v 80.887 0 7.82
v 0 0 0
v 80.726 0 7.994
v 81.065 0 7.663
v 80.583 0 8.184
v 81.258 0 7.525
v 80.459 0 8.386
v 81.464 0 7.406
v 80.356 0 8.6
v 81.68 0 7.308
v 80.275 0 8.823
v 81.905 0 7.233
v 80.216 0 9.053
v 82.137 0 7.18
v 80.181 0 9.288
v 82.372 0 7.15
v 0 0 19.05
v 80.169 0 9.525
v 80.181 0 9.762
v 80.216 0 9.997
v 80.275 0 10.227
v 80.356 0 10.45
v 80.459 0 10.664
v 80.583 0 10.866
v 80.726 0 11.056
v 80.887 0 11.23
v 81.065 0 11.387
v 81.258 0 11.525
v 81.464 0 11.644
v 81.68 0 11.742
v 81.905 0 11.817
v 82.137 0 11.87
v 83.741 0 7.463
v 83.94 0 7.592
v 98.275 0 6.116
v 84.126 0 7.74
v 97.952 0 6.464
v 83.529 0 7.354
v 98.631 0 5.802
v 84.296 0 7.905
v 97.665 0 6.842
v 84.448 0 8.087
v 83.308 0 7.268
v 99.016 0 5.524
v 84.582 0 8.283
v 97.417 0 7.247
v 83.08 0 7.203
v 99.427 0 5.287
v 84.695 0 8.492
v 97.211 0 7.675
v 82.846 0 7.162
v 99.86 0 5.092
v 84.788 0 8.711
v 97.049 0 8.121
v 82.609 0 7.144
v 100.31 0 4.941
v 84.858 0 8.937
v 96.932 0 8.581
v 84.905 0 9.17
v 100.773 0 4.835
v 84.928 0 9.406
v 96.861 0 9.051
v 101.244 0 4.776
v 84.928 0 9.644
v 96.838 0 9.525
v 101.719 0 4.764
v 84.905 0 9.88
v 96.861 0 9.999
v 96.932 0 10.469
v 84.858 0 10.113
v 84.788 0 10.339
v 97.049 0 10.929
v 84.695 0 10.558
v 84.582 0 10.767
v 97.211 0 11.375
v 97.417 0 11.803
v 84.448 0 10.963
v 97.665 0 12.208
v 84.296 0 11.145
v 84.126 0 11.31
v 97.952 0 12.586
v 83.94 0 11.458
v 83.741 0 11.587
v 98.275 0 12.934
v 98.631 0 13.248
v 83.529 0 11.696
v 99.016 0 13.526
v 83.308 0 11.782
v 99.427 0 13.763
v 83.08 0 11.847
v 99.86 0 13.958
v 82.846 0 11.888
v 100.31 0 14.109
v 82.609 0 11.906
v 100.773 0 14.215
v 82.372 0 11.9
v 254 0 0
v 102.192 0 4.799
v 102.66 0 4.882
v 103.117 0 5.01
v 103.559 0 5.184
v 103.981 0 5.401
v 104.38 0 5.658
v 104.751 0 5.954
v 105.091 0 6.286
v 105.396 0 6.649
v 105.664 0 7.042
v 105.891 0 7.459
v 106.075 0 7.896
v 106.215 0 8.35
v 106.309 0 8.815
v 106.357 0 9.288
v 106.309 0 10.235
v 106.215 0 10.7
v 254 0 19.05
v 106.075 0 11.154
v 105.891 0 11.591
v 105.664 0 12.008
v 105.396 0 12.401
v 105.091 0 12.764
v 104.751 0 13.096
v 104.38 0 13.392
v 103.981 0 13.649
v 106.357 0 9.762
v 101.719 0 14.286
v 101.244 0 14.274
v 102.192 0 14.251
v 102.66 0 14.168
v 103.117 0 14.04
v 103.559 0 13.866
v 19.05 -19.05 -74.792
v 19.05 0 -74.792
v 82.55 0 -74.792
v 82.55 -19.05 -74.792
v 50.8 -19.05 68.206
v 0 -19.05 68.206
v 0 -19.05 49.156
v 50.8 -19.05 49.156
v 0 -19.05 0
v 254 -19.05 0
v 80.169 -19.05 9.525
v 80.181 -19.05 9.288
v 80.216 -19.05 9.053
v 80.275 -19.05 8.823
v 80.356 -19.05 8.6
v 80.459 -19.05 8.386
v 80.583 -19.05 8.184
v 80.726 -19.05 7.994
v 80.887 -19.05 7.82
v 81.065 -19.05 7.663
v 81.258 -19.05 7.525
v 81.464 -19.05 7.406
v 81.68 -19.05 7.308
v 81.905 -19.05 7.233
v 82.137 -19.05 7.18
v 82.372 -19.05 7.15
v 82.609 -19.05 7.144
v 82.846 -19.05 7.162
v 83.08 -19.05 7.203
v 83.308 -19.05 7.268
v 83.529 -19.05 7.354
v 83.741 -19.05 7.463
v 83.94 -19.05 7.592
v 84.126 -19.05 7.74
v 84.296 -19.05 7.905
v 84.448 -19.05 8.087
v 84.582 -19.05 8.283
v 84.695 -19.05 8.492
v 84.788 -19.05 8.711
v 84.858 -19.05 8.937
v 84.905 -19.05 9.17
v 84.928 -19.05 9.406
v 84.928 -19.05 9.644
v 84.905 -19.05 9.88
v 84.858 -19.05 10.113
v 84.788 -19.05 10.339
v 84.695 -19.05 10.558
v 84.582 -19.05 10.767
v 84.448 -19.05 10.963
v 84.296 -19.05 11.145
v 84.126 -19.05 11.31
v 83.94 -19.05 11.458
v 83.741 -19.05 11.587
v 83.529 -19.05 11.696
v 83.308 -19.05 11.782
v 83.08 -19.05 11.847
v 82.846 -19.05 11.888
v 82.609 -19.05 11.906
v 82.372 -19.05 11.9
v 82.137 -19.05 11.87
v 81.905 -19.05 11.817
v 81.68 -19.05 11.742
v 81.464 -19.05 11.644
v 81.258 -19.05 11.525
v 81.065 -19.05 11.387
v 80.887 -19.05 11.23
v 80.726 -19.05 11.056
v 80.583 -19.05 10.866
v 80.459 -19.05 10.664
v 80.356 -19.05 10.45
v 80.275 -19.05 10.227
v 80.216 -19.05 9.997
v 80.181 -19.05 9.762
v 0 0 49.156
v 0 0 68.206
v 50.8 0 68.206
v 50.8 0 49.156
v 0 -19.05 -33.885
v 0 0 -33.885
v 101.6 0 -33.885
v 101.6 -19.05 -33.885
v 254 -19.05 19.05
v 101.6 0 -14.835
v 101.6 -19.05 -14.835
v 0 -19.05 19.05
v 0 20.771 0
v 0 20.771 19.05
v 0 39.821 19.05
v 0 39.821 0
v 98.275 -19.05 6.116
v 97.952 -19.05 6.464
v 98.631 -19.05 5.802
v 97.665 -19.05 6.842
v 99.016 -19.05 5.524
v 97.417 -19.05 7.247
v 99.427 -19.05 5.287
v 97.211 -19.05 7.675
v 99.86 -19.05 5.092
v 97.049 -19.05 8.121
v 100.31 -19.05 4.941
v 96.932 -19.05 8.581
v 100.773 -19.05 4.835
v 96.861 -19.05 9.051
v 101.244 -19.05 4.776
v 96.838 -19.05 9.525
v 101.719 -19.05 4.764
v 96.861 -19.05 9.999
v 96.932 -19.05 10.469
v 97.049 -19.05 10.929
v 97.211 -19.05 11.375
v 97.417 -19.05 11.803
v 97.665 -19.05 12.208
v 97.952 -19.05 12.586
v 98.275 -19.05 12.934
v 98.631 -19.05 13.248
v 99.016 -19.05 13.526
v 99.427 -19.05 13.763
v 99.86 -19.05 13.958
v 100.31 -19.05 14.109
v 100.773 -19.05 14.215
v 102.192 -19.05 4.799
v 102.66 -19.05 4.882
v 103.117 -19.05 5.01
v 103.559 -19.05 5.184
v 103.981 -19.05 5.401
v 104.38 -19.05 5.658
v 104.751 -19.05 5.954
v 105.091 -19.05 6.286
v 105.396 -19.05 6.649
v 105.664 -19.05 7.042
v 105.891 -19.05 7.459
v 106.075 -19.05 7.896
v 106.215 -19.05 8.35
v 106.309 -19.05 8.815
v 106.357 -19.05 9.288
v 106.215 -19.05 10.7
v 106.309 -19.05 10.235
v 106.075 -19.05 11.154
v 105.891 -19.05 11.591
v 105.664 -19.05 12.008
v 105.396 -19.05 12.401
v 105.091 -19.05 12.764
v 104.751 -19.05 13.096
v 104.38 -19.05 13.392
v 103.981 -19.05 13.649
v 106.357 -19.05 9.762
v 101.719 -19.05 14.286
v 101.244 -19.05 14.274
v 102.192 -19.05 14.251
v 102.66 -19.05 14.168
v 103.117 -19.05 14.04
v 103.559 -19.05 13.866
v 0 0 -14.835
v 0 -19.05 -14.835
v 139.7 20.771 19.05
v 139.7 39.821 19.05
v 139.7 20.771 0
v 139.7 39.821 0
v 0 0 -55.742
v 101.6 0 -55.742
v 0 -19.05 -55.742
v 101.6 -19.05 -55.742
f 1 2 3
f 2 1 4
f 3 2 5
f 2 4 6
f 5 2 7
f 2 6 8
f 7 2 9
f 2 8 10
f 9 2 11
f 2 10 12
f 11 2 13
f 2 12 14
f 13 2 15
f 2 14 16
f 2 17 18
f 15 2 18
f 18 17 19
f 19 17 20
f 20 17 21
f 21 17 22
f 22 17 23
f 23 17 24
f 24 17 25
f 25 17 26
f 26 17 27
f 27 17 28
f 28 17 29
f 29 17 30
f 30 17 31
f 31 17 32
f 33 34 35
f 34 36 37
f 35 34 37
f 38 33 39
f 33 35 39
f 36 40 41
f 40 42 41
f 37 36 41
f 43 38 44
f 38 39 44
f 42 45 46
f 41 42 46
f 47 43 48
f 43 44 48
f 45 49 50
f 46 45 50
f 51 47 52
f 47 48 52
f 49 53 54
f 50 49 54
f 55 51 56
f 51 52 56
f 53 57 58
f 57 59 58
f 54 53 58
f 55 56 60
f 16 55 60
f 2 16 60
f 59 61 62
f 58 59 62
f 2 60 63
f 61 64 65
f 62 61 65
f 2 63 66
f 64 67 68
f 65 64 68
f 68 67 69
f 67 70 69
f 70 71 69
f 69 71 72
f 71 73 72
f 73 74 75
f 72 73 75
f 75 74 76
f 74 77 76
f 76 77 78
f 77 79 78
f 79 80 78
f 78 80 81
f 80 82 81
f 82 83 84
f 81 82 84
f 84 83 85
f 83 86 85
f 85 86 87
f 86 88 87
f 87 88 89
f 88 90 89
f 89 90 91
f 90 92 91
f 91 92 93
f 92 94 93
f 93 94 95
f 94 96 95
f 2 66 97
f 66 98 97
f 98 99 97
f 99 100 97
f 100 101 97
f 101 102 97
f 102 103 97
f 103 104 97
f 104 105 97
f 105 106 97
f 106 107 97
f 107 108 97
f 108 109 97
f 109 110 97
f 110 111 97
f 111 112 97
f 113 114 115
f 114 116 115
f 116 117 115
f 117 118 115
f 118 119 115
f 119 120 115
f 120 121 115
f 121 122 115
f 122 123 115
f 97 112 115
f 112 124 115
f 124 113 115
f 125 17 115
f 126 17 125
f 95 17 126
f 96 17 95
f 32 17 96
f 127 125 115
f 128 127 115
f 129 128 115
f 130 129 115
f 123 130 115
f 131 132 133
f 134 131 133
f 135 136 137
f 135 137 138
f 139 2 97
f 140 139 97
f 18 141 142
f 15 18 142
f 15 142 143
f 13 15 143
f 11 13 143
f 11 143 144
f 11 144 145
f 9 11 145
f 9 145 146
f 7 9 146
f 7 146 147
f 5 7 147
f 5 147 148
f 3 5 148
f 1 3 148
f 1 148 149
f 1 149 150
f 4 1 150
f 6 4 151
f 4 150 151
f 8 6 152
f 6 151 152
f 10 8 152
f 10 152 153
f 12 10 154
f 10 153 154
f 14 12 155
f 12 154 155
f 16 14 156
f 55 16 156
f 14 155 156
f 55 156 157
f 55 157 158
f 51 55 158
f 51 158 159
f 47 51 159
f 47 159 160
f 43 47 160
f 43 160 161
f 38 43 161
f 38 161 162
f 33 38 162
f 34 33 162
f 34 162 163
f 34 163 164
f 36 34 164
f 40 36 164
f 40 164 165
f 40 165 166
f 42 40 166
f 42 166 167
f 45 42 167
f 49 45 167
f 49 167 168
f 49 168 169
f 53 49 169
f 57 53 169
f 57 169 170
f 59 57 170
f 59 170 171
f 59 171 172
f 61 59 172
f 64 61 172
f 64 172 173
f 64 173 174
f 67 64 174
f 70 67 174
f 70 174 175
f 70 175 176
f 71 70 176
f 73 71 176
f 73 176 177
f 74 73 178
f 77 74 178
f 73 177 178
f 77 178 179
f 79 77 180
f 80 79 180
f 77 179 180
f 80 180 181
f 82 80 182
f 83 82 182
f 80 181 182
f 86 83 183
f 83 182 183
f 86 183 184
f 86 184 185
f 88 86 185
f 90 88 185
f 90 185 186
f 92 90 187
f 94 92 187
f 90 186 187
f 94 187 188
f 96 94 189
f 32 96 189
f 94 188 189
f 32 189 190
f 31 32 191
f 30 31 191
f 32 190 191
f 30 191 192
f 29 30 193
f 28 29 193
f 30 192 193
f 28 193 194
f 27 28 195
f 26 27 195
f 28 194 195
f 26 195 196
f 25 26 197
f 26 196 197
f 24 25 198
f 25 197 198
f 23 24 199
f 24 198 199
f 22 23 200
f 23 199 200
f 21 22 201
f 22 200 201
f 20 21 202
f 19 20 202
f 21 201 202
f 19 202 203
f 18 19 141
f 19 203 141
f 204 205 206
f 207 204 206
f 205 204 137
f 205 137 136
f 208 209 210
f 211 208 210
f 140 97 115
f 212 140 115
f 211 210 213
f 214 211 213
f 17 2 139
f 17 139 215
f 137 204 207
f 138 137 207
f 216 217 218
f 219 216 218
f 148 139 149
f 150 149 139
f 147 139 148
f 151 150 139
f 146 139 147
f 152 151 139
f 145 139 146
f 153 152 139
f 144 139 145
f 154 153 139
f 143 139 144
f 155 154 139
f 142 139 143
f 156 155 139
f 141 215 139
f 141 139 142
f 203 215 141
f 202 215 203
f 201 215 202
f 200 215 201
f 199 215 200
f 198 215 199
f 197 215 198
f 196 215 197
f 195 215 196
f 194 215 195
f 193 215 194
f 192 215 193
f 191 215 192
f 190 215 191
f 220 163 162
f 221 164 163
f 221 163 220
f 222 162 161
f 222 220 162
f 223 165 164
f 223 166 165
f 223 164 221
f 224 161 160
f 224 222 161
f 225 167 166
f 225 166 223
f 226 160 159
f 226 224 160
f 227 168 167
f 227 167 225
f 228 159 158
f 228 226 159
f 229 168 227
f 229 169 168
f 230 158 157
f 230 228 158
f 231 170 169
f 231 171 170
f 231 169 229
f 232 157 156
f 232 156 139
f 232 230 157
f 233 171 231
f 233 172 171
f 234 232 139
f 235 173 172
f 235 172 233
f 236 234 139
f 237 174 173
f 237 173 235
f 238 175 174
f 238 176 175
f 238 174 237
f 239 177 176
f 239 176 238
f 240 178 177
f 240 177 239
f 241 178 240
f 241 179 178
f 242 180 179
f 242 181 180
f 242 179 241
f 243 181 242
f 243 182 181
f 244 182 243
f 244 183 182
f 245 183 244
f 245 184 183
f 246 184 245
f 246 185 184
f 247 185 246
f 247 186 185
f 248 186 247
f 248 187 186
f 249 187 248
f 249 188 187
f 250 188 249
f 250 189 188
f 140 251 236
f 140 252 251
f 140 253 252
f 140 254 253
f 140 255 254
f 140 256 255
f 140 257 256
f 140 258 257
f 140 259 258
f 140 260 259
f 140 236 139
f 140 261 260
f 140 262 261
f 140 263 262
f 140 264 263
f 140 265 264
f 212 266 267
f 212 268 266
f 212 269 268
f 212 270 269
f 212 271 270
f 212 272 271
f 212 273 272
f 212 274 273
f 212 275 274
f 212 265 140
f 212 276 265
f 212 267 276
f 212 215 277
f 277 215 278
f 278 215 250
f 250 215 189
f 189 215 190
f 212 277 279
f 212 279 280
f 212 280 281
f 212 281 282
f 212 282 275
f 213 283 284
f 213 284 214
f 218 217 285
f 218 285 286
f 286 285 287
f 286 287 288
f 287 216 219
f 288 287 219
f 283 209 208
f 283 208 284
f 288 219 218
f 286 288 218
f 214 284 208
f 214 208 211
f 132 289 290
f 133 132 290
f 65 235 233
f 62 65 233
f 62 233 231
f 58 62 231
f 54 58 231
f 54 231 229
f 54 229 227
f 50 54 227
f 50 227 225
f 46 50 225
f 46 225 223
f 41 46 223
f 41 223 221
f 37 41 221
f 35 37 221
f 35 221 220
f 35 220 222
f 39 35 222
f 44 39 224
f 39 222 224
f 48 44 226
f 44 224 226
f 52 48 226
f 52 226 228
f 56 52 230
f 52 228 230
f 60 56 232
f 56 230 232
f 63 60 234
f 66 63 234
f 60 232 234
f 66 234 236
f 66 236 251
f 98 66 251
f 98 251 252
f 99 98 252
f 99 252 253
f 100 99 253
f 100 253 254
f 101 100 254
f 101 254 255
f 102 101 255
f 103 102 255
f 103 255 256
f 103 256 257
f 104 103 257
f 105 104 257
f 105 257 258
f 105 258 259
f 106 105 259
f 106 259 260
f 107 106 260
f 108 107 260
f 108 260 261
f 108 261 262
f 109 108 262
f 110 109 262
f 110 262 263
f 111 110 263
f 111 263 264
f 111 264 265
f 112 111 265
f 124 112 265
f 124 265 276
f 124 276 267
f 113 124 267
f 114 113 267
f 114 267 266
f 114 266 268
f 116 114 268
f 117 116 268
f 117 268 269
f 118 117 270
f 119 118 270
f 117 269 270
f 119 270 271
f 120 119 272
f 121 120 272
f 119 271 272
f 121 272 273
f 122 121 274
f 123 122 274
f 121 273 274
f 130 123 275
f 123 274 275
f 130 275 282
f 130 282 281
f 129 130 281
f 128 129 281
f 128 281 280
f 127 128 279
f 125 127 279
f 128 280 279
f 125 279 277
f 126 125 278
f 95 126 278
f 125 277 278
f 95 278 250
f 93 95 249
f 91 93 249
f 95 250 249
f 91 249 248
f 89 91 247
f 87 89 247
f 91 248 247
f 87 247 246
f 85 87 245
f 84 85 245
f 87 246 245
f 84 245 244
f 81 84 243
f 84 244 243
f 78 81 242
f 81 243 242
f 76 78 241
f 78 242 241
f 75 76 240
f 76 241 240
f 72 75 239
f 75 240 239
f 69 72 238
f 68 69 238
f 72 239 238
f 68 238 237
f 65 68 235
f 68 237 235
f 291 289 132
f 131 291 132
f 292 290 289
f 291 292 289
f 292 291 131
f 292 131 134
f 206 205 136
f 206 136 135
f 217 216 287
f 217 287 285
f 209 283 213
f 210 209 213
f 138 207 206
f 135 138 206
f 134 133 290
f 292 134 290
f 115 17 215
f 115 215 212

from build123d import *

# Parameters (mm, degrees)
F0_W      = 254
F0_H      = 19.05
F1_DEPTH  = 19.05
F3_DEPTH  = 25.4
F4_W      = 101.6
F4_H      = 19.05
F5_DEPTH  = 19.05
F7_DEPTH  = 19.05
F8_W      = 50.8
F8_H      = 19.05
F9_DEPTH  = 19.05
F10_W     = 19.05
F10_H     = 19.05
F11_DEPTH = 139.7


with BuildPart() as f1:
    # F0 (on Front) → F1 (new body)
    with BuildSketch(Plane.XZ):
        with Locations((127, 9.525)):
            Rectangle(F0_W, F0_H)
    extrude(amount=F1_DEPTH)

    # F2 (on face) → F3 (cut)
    with BuildSketch(Plane.XZ.offset(19.05)):
        with BuildLine():
            ThreePointArc((84.93125, 9.525), (82.55, 11.90625), (80.16875, 9.525))
            Line((80.16875, 9.525), (82.55, 9.525))
            Line((82.55, 9.525), (84.93125, 9.525))
        make_face()
        with BuildLine():
            ThreePointArc((106.3625, 9.525), (101.6, 14.2875), (96.8375, 9.525))
            ThreePointArc((96.8375, 9.525), (101.6, 4.7625), (106.3625, 9.525))
        make_face()
        with BuildLine():
            Line((82.55, 9.525), (80.16875, 9.525))
            ThreePointArc((80.16875, 9.525), (82.55, 7.14375), (84.93125, 9.525))
            Line((84.93125, 9.525), (82.55, 9.525))
        make_face()
    extrude(amount=-F3_DEPTH, mode=Mode.SUBTRACT)


with BuildPart() as f5:
    # F4 (on Front) → F5 (new body)
    with BuildSketch(Plane.XZ):
        with Locations((50.8, -24.360368)):
            Rectangle(F4_W, F4_H)
    extrude(amount=F5_DEPTH)


with BuildPart() as f7:
    # F6 (on Front) → F7 (new body)
    with BuildSketch(Plane.XZ):
        Polygon((101.6, -55.741971), (0, -55.741971), (19.05, -74.791971), (82.55, -74.791971), align=None)
    extrude(amount=F7_DEPTH)


with BuildPart() as f9:
    # F8 (on Front) → F9 (new body)
    with BuildSketch(Plane.XZ):
        with Locations((25.4, 58.681494)):
            Rectangle(F8_W, F8_H)
    extrude(amount=F9_DEPTH)


with BuildPart() as f11:
    # F10 (on Right) → F11 (new body)
    with BuildSketch(Plane.YZ):
        with Locations((30.295648, 9.525)):
            Rectangle(F10_W, F10_H)
    extrude(amount=F11_DEPTH)


solid = Compound([f1.part, f5.part, f7.part, f9.part, f11.part])
